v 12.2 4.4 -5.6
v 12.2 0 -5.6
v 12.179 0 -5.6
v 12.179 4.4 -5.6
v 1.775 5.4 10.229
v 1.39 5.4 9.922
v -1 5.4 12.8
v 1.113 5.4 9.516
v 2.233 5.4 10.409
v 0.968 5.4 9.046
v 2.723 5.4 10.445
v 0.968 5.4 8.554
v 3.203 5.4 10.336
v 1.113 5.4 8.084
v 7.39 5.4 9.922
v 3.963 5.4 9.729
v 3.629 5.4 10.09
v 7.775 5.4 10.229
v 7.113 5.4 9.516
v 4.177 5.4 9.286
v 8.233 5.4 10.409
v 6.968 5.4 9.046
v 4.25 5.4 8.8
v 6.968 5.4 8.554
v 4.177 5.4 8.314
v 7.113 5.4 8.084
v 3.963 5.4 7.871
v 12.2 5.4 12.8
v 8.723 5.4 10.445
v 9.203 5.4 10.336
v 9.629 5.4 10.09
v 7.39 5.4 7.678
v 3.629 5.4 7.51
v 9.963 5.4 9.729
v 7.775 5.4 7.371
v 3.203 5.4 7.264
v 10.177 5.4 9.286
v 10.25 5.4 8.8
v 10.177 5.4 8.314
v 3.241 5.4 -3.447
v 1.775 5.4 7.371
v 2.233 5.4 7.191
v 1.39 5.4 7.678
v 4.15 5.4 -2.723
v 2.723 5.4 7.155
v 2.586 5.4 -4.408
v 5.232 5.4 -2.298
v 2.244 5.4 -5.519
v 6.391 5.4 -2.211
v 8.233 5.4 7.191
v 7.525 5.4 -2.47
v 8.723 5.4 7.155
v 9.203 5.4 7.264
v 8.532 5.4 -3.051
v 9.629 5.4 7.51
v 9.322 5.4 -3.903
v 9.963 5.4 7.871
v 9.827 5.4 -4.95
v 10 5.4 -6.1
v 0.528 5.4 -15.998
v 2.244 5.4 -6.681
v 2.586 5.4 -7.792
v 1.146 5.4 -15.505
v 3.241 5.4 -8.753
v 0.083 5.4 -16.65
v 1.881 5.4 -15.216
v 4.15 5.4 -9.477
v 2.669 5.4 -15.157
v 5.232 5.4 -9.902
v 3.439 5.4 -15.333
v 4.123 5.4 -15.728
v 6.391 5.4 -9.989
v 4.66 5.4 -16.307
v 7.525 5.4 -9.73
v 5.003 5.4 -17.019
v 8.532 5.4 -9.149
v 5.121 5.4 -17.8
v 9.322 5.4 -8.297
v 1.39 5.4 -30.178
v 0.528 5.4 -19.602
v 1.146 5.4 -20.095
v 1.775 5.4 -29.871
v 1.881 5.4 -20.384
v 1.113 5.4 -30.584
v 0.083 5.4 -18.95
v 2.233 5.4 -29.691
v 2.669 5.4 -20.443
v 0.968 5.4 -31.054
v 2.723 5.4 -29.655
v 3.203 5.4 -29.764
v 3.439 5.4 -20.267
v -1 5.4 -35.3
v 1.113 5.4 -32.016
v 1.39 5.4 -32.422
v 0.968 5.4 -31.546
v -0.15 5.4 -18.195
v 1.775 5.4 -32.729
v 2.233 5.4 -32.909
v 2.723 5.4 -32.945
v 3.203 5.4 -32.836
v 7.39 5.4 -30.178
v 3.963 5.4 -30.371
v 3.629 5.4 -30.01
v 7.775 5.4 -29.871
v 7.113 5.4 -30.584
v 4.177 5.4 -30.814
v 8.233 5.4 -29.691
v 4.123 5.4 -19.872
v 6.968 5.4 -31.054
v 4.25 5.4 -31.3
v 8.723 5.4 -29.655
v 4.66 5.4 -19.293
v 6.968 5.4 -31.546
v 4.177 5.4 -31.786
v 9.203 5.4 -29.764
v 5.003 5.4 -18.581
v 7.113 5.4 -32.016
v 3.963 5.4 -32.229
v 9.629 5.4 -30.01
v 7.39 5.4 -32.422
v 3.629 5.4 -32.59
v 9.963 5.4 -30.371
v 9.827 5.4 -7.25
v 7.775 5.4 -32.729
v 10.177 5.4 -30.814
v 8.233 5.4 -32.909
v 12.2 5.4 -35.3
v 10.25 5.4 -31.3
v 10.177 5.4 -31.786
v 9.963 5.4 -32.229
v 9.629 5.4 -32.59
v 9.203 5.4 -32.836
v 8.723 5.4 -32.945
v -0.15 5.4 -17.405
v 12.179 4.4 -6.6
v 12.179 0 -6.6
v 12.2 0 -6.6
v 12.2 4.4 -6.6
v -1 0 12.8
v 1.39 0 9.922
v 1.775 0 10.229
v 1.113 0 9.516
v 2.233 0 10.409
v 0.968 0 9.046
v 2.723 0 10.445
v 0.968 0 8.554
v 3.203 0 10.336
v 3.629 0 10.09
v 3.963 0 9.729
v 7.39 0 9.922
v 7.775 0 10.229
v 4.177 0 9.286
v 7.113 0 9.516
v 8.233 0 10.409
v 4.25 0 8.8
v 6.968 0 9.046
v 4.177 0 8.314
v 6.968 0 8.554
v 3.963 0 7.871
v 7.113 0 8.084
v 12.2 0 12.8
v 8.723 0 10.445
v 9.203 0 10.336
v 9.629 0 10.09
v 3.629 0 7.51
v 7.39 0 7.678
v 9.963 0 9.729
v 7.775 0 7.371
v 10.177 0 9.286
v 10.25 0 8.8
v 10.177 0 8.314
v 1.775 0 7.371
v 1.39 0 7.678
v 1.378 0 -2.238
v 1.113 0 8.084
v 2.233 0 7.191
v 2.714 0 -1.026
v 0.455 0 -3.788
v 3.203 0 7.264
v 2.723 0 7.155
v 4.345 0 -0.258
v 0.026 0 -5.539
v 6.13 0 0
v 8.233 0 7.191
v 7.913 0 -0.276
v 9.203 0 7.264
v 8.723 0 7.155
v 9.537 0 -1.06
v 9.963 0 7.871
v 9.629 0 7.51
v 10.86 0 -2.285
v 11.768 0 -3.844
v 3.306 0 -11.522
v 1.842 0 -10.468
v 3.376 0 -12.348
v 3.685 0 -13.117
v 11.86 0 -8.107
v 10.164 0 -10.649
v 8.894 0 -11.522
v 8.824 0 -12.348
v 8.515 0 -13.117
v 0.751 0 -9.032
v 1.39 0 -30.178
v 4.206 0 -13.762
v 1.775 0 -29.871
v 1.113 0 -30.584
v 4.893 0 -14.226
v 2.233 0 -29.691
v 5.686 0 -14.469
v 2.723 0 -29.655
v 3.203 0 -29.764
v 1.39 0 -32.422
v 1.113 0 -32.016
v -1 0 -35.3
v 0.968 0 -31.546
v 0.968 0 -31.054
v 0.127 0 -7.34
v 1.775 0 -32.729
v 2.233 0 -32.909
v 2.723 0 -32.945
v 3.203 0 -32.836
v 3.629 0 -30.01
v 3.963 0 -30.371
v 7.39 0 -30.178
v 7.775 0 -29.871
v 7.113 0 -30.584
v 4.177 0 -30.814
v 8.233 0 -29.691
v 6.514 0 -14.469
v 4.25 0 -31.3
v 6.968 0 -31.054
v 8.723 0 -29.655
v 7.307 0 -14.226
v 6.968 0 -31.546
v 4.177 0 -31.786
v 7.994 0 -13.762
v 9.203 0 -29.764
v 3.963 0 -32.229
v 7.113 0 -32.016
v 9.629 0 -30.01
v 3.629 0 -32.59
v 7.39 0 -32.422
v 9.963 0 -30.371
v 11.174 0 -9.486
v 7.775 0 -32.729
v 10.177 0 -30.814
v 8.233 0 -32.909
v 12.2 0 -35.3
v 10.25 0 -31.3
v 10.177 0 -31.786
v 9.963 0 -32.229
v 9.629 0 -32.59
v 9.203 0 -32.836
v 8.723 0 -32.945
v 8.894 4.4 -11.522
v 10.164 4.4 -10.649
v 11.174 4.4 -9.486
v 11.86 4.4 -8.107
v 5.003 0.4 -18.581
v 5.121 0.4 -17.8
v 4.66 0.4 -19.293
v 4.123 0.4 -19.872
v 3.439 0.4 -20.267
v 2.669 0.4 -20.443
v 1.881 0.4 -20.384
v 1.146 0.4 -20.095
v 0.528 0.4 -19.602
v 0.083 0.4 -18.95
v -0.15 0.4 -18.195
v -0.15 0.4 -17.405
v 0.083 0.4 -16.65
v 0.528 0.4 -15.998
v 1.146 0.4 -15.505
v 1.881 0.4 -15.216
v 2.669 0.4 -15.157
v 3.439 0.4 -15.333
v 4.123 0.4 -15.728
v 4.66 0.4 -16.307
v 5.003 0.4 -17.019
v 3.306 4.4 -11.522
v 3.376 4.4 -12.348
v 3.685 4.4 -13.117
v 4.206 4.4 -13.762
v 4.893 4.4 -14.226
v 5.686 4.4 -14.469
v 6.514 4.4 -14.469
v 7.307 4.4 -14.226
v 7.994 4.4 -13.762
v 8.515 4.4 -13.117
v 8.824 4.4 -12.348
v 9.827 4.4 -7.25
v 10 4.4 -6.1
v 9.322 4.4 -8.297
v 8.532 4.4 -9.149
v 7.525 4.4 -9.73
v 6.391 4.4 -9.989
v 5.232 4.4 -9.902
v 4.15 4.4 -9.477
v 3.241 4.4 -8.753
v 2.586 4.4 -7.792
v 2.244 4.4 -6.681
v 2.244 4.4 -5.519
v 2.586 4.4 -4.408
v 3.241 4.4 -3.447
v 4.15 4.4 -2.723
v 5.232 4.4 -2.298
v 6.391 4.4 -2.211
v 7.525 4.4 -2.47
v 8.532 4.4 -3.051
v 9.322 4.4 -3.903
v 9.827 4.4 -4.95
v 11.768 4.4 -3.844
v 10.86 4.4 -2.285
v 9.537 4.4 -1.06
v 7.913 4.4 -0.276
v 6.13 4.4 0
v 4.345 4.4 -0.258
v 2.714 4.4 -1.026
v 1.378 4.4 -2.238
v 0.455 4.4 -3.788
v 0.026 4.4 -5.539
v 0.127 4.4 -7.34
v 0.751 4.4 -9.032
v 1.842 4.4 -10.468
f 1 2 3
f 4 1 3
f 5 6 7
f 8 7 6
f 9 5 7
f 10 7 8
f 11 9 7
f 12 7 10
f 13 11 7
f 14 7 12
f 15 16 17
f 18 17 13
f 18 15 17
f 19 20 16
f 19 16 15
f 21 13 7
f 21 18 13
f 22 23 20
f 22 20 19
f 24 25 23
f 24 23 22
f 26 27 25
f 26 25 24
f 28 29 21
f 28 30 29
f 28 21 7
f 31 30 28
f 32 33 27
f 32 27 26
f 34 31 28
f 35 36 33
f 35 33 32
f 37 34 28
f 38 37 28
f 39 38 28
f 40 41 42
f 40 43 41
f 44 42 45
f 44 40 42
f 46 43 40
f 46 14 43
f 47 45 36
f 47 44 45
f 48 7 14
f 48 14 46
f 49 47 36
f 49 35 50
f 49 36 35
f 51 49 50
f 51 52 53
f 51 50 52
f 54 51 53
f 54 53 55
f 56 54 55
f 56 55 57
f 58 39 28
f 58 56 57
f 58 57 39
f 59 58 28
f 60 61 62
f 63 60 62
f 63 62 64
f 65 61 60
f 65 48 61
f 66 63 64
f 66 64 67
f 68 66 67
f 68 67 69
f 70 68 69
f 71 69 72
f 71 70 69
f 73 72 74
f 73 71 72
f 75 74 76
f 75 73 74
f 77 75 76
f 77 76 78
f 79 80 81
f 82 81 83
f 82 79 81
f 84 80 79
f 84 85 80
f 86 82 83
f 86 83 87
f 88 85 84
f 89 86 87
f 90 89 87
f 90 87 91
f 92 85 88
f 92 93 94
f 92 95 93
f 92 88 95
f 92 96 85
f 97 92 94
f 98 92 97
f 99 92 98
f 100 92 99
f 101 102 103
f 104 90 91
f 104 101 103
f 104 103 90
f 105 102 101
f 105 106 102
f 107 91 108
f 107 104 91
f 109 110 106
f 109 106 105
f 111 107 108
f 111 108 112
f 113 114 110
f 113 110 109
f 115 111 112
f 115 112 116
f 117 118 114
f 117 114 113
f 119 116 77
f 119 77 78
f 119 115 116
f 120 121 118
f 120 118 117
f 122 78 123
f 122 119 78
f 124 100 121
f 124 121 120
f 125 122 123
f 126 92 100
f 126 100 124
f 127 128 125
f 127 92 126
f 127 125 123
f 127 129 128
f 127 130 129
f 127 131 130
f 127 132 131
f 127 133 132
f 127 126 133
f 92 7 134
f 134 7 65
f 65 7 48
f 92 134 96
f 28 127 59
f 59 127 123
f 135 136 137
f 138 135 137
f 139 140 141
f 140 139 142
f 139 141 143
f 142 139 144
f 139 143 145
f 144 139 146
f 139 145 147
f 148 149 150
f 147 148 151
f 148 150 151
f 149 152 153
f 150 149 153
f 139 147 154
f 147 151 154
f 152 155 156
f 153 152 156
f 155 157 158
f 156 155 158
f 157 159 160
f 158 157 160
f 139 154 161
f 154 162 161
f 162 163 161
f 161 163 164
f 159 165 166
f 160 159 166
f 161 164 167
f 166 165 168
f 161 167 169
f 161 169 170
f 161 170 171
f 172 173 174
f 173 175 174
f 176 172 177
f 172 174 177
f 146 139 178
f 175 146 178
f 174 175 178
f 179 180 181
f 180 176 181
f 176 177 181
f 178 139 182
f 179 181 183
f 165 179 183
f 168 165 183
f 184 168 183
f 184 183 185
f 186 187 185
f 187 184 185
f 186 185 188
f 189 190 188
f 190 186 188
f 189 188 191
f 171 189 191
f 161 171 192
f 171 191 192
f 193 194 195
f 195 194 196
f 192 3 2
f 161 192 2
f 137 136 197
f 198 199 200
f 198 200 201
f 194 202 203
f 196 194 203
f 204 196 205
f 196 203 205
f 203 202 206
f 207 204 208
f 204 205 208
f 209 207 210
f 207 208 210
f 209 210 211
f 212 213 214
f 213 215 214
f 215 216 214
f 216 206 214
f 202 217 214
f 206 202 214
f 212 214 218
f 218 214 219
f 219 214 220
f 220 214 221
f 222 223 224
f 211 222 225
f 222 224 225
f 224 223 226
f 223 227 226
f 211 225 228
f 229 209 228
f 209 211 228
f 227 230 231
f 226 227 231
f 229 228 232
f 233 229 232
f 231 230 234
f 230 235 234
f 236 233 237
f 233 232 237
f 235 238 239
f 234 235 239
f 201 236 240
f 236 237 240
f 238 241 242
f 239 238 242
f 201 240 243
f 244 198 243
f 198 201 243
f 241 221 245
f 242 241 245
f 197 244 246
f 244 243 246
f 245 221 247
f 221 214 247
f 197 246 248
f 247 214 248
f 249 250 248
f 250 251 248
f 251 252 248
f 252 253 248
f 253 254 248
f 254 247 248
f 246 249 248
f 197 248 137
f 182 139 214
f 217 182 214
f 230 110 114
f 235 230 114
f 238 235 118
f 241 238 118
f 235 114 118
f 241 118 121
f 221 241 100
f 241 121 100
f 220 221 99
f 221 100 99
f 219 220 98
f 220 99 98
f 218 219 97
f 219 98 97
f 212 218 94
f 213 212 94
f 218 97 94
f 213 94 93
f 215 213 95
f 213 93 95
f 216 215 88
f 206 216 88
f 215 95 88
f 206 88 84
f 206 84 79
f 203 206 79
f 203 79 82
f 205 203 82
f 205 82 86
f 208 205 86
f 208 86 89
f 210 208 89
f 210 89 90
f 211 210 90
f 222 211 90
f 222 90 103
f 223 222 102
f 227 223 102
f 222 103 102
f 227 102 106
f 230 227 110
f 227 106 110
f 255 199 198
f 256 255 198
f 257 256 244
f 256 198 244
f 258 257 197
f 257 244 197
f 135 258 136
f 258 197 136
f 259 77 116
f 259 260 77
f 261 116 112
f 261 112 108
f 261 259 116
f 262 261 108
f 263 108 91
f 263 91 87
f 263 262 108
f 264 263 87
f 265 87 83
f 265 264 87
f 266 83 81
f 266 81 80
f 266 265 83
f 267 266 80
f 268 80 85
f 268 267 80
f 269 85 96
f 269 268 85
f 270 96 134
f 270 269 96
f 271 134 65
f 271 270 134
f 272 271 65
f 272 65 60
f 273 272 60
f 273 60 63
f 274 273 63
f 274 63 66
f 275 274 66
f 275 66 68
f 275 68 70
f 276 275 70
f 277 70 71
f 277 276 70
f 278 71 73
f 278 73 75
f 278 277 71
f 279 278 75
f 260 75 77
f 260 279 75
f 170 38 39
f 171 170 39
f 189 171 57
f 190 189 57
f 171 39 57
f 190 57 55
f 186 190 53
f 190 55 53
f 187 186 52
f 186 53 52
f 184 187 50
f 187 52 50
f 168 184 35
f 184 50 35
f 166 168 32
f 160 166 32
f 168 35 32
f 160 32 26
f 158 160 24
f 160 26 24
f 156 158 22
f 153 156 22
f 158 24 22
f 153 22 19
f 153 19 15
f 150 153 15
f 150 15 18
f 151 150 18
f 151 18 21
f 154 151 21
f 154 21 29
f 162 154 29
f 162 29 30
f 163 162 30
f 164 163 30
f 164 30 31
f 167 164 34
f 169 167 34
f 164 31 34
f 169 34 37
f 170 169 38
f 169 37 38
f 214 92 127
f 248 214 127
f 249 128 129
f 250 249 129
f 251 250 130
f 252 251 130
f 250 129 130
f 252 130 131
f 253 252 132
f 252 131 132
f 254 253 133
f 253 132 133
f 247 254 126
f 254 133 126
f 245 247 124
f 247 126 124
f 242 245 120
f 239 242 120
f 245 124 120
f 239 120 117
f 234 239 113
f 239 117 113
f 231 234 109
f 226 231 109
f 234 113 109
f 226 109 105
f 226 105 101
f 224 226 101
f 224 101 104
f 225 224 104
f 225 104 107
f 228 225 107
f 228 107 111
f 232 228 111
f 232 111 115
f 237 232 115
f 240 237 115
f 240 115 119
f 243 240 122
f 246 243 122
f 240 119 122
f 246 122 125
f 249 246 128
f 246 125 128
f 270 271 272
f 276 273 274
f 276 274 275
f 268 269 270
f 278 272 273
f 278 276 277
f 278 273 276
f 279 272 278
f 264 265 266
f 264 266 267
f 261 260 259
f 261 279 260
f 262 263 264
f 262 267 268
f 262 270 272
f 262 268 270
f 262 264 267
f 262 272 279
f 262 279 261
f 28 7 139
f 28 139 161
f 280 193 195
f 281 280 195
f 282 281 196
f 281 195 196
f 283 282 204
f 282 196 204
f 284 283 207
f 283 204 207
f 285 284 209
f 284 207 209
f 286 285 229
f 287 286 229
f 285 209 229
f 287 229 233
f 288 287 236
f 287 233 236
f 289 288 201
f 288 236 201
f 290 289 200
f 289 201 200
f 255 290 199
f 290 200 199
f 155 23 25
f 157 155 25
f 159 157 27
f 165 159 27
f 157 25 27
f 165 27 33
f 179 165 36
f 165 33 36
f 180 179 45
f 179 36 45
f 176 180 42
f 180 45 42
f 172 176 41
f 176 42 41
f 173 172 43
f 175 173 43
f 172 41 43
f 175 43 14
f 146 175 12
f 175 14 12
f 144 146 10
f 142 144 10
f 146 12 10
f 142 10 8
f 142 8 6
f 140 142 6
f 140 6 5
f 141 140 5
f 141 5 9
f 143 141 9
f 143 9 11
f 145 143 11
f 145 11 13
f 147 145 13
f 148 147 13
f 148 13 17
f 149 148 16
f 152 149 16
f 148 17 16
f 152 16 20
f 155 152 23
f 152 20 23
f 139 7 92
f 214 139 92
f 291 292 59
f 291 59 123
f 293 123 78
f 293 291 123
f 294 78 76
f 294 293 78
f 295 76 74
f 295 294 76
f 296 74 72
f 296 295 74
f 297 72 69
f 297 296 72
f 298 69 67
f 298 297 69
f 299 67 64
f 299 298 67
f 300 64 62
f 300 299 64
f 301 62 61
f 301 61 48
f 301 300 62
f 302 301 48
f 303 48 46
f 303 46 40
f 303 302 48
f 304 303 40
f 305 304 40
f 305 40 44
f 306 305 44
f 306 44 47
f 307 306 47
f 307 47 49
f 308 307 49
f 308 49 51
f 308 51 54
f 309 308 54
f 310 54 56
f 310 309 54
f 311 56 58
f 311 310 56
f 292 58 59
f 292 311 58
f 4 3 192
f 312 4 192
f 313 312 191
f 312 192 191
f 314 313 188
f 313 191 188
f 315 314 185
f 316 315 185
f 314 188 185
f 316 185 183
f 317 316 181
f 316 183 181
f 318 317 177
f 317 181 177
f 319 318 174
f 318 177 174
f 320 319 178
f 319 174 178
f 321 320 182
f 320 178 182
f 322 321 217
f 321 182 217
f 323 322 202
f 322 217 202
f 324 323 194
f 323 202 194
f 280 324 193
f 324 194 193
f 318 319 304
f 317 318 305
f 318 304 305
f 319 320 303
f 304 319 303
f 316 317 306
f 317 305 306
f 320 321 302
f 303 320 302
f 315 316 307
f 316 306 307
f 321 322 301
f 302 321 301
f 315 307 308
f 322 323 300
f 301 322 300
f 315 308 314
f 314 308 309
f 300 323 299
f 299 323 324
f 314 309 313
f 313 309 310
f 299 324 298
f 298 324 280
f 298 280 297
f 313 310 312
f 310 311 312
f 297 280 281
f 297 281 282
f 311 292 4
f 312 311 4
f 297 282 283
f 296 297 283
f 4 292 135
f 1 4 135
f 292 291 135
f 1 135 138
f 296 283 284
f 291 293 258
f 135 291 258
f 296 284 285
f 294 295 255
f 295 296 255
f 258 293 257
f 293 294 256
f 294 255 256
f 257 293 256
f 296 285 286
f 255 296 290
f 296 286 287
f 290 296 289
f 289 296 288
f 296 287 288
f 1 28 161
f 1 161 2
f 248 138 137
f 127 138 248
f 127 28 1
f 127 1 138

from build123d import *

# Parameters (mm, degrees)
BOSS_EXTRUDE1_DEPTH = 4.4
SKETCH2_R           = 2.65
CUT_EXTRUDE1_DEPTH  = 4
SKETCH5_W           = 13.2
SKETCH5_H           = 32.1
SKETCH5_R           = 2.65
SKETCH5_R_2         = 3.9
BOSS_EXTRUDE5_DEPTH = 1
SKETCH7_W           = 13.2
SKETCH7_H           = 8
SKETCH7_R           = 1.65
BOSS_EXTRUDE7_DEPTH = 5.4


with BuildPart() as part:
    # Sketch1 → Boss-Extrude1 (new body)
    with BuildSketch(Plane(origin=(0, 0, 0), x_dir=(1, 0, 0), z_dir=(0, 1, 0))):
        with BuildLine():
            ThreePointArc((8.894356871, 11.522321429), (11.17380815, 9.48621778), (12.179473661, 6.6))
            Line((12.179473661, 6.6), (12.2, 6.6))
            Line((12.2, 6.6), (12.2, 22.5))
            Line((12.2, 22.5), (12.2, 27.3))
            Line((12.2, 27.3), (-1, 27.3))
            Line((-1, 27.3), (-1, -4.8))
            Line((-1, -4.8), (12.2, -4.8))
            Line((12.2, -4.8), (12.2, 0))
            Line((12.2, 0), (12.2, 5.6))
            Line((12.2, 5.6), (12.179473661, 5.6))
            ThreePointArc((12.179473661, 5.6), (2.71378222, 1.02619185), (3.305643129, 11.522321429))
            ThreePointArc((3.305643129, 11.522321429), (6.1, 14.5), (8.894356871, 11.522321429))
        make_face()
    extrude(amount=BOSS_EXTRUDE1_DEPTH)

    # Sketch2 → Cut-Extrude1 (cut)
    with BuildSketch(Plane(origin=(0, 4.4, 0), x_dir=(1, 0, 0), z_dir=(0, 1, 0))):
        with Locations((2.470606111, 17.8)):
            Circle(SKETCH2_R)
    extrude(amount=-CUT_EXTRUDE1_DEPTH, mode=Mode.SUBTRACT)

    # Sketch5 → Boss-Extrude5 (add)
    with BuildSketch(Plane(origin=(0, 4.4, 0), x_dir=(1, 0, 0), z_dir=(0, 1, 0))):
        with Locations((5.6, 11.25)):
            Rectangle(SKETCH5_W, SKETCH5_H)
        with Locations((2.470606111, 17.8)):
            Circle(SKETCH5_R, mode=Mode.SUBTRACT)
        with Locations((6.1, 6.1)):
            Circle(SKETCH5_R_2, mode=Mode.SUBTRACT)
    extrude(amount=BOSS_EXTRUDE5_DEPTH)

    # Sketch7 → Boss-Extrude7 (add)
    with BuildSketch(Plane(origin=(0, 5.4, 0), x_dir=(1, 0, 0), z_dir=(0, 1, 0))):
        with Locations((5.6, -8.8)):
            Rectangle(SKETCH7_W, SKETCH7_H)
        with Locations((8.6, -8.8)):
            Circle(SKETCH7_R, mode=Mode.SUBTRACT)
        with Locations((2.6, -8.8)):
            Circle(SKETCH7_R, mode=Mode.SUBTRACT)
        with Locations((5.6, 31.3)):
            Rectangle(SKETCH7_W, SKETCH7_H)
        with Locations((8.6, 31.3)):
            Circle(SKETCH7_R, mode=Mode.SUBTRACT)
        with Locations((2.6, 31.3)):
            Circle(SKETCH7_R, mode=Mode.SUBTRACT)
    extrude(amount=-BOSS_EXTRUDE7_DEPTH)


solid = part.part
